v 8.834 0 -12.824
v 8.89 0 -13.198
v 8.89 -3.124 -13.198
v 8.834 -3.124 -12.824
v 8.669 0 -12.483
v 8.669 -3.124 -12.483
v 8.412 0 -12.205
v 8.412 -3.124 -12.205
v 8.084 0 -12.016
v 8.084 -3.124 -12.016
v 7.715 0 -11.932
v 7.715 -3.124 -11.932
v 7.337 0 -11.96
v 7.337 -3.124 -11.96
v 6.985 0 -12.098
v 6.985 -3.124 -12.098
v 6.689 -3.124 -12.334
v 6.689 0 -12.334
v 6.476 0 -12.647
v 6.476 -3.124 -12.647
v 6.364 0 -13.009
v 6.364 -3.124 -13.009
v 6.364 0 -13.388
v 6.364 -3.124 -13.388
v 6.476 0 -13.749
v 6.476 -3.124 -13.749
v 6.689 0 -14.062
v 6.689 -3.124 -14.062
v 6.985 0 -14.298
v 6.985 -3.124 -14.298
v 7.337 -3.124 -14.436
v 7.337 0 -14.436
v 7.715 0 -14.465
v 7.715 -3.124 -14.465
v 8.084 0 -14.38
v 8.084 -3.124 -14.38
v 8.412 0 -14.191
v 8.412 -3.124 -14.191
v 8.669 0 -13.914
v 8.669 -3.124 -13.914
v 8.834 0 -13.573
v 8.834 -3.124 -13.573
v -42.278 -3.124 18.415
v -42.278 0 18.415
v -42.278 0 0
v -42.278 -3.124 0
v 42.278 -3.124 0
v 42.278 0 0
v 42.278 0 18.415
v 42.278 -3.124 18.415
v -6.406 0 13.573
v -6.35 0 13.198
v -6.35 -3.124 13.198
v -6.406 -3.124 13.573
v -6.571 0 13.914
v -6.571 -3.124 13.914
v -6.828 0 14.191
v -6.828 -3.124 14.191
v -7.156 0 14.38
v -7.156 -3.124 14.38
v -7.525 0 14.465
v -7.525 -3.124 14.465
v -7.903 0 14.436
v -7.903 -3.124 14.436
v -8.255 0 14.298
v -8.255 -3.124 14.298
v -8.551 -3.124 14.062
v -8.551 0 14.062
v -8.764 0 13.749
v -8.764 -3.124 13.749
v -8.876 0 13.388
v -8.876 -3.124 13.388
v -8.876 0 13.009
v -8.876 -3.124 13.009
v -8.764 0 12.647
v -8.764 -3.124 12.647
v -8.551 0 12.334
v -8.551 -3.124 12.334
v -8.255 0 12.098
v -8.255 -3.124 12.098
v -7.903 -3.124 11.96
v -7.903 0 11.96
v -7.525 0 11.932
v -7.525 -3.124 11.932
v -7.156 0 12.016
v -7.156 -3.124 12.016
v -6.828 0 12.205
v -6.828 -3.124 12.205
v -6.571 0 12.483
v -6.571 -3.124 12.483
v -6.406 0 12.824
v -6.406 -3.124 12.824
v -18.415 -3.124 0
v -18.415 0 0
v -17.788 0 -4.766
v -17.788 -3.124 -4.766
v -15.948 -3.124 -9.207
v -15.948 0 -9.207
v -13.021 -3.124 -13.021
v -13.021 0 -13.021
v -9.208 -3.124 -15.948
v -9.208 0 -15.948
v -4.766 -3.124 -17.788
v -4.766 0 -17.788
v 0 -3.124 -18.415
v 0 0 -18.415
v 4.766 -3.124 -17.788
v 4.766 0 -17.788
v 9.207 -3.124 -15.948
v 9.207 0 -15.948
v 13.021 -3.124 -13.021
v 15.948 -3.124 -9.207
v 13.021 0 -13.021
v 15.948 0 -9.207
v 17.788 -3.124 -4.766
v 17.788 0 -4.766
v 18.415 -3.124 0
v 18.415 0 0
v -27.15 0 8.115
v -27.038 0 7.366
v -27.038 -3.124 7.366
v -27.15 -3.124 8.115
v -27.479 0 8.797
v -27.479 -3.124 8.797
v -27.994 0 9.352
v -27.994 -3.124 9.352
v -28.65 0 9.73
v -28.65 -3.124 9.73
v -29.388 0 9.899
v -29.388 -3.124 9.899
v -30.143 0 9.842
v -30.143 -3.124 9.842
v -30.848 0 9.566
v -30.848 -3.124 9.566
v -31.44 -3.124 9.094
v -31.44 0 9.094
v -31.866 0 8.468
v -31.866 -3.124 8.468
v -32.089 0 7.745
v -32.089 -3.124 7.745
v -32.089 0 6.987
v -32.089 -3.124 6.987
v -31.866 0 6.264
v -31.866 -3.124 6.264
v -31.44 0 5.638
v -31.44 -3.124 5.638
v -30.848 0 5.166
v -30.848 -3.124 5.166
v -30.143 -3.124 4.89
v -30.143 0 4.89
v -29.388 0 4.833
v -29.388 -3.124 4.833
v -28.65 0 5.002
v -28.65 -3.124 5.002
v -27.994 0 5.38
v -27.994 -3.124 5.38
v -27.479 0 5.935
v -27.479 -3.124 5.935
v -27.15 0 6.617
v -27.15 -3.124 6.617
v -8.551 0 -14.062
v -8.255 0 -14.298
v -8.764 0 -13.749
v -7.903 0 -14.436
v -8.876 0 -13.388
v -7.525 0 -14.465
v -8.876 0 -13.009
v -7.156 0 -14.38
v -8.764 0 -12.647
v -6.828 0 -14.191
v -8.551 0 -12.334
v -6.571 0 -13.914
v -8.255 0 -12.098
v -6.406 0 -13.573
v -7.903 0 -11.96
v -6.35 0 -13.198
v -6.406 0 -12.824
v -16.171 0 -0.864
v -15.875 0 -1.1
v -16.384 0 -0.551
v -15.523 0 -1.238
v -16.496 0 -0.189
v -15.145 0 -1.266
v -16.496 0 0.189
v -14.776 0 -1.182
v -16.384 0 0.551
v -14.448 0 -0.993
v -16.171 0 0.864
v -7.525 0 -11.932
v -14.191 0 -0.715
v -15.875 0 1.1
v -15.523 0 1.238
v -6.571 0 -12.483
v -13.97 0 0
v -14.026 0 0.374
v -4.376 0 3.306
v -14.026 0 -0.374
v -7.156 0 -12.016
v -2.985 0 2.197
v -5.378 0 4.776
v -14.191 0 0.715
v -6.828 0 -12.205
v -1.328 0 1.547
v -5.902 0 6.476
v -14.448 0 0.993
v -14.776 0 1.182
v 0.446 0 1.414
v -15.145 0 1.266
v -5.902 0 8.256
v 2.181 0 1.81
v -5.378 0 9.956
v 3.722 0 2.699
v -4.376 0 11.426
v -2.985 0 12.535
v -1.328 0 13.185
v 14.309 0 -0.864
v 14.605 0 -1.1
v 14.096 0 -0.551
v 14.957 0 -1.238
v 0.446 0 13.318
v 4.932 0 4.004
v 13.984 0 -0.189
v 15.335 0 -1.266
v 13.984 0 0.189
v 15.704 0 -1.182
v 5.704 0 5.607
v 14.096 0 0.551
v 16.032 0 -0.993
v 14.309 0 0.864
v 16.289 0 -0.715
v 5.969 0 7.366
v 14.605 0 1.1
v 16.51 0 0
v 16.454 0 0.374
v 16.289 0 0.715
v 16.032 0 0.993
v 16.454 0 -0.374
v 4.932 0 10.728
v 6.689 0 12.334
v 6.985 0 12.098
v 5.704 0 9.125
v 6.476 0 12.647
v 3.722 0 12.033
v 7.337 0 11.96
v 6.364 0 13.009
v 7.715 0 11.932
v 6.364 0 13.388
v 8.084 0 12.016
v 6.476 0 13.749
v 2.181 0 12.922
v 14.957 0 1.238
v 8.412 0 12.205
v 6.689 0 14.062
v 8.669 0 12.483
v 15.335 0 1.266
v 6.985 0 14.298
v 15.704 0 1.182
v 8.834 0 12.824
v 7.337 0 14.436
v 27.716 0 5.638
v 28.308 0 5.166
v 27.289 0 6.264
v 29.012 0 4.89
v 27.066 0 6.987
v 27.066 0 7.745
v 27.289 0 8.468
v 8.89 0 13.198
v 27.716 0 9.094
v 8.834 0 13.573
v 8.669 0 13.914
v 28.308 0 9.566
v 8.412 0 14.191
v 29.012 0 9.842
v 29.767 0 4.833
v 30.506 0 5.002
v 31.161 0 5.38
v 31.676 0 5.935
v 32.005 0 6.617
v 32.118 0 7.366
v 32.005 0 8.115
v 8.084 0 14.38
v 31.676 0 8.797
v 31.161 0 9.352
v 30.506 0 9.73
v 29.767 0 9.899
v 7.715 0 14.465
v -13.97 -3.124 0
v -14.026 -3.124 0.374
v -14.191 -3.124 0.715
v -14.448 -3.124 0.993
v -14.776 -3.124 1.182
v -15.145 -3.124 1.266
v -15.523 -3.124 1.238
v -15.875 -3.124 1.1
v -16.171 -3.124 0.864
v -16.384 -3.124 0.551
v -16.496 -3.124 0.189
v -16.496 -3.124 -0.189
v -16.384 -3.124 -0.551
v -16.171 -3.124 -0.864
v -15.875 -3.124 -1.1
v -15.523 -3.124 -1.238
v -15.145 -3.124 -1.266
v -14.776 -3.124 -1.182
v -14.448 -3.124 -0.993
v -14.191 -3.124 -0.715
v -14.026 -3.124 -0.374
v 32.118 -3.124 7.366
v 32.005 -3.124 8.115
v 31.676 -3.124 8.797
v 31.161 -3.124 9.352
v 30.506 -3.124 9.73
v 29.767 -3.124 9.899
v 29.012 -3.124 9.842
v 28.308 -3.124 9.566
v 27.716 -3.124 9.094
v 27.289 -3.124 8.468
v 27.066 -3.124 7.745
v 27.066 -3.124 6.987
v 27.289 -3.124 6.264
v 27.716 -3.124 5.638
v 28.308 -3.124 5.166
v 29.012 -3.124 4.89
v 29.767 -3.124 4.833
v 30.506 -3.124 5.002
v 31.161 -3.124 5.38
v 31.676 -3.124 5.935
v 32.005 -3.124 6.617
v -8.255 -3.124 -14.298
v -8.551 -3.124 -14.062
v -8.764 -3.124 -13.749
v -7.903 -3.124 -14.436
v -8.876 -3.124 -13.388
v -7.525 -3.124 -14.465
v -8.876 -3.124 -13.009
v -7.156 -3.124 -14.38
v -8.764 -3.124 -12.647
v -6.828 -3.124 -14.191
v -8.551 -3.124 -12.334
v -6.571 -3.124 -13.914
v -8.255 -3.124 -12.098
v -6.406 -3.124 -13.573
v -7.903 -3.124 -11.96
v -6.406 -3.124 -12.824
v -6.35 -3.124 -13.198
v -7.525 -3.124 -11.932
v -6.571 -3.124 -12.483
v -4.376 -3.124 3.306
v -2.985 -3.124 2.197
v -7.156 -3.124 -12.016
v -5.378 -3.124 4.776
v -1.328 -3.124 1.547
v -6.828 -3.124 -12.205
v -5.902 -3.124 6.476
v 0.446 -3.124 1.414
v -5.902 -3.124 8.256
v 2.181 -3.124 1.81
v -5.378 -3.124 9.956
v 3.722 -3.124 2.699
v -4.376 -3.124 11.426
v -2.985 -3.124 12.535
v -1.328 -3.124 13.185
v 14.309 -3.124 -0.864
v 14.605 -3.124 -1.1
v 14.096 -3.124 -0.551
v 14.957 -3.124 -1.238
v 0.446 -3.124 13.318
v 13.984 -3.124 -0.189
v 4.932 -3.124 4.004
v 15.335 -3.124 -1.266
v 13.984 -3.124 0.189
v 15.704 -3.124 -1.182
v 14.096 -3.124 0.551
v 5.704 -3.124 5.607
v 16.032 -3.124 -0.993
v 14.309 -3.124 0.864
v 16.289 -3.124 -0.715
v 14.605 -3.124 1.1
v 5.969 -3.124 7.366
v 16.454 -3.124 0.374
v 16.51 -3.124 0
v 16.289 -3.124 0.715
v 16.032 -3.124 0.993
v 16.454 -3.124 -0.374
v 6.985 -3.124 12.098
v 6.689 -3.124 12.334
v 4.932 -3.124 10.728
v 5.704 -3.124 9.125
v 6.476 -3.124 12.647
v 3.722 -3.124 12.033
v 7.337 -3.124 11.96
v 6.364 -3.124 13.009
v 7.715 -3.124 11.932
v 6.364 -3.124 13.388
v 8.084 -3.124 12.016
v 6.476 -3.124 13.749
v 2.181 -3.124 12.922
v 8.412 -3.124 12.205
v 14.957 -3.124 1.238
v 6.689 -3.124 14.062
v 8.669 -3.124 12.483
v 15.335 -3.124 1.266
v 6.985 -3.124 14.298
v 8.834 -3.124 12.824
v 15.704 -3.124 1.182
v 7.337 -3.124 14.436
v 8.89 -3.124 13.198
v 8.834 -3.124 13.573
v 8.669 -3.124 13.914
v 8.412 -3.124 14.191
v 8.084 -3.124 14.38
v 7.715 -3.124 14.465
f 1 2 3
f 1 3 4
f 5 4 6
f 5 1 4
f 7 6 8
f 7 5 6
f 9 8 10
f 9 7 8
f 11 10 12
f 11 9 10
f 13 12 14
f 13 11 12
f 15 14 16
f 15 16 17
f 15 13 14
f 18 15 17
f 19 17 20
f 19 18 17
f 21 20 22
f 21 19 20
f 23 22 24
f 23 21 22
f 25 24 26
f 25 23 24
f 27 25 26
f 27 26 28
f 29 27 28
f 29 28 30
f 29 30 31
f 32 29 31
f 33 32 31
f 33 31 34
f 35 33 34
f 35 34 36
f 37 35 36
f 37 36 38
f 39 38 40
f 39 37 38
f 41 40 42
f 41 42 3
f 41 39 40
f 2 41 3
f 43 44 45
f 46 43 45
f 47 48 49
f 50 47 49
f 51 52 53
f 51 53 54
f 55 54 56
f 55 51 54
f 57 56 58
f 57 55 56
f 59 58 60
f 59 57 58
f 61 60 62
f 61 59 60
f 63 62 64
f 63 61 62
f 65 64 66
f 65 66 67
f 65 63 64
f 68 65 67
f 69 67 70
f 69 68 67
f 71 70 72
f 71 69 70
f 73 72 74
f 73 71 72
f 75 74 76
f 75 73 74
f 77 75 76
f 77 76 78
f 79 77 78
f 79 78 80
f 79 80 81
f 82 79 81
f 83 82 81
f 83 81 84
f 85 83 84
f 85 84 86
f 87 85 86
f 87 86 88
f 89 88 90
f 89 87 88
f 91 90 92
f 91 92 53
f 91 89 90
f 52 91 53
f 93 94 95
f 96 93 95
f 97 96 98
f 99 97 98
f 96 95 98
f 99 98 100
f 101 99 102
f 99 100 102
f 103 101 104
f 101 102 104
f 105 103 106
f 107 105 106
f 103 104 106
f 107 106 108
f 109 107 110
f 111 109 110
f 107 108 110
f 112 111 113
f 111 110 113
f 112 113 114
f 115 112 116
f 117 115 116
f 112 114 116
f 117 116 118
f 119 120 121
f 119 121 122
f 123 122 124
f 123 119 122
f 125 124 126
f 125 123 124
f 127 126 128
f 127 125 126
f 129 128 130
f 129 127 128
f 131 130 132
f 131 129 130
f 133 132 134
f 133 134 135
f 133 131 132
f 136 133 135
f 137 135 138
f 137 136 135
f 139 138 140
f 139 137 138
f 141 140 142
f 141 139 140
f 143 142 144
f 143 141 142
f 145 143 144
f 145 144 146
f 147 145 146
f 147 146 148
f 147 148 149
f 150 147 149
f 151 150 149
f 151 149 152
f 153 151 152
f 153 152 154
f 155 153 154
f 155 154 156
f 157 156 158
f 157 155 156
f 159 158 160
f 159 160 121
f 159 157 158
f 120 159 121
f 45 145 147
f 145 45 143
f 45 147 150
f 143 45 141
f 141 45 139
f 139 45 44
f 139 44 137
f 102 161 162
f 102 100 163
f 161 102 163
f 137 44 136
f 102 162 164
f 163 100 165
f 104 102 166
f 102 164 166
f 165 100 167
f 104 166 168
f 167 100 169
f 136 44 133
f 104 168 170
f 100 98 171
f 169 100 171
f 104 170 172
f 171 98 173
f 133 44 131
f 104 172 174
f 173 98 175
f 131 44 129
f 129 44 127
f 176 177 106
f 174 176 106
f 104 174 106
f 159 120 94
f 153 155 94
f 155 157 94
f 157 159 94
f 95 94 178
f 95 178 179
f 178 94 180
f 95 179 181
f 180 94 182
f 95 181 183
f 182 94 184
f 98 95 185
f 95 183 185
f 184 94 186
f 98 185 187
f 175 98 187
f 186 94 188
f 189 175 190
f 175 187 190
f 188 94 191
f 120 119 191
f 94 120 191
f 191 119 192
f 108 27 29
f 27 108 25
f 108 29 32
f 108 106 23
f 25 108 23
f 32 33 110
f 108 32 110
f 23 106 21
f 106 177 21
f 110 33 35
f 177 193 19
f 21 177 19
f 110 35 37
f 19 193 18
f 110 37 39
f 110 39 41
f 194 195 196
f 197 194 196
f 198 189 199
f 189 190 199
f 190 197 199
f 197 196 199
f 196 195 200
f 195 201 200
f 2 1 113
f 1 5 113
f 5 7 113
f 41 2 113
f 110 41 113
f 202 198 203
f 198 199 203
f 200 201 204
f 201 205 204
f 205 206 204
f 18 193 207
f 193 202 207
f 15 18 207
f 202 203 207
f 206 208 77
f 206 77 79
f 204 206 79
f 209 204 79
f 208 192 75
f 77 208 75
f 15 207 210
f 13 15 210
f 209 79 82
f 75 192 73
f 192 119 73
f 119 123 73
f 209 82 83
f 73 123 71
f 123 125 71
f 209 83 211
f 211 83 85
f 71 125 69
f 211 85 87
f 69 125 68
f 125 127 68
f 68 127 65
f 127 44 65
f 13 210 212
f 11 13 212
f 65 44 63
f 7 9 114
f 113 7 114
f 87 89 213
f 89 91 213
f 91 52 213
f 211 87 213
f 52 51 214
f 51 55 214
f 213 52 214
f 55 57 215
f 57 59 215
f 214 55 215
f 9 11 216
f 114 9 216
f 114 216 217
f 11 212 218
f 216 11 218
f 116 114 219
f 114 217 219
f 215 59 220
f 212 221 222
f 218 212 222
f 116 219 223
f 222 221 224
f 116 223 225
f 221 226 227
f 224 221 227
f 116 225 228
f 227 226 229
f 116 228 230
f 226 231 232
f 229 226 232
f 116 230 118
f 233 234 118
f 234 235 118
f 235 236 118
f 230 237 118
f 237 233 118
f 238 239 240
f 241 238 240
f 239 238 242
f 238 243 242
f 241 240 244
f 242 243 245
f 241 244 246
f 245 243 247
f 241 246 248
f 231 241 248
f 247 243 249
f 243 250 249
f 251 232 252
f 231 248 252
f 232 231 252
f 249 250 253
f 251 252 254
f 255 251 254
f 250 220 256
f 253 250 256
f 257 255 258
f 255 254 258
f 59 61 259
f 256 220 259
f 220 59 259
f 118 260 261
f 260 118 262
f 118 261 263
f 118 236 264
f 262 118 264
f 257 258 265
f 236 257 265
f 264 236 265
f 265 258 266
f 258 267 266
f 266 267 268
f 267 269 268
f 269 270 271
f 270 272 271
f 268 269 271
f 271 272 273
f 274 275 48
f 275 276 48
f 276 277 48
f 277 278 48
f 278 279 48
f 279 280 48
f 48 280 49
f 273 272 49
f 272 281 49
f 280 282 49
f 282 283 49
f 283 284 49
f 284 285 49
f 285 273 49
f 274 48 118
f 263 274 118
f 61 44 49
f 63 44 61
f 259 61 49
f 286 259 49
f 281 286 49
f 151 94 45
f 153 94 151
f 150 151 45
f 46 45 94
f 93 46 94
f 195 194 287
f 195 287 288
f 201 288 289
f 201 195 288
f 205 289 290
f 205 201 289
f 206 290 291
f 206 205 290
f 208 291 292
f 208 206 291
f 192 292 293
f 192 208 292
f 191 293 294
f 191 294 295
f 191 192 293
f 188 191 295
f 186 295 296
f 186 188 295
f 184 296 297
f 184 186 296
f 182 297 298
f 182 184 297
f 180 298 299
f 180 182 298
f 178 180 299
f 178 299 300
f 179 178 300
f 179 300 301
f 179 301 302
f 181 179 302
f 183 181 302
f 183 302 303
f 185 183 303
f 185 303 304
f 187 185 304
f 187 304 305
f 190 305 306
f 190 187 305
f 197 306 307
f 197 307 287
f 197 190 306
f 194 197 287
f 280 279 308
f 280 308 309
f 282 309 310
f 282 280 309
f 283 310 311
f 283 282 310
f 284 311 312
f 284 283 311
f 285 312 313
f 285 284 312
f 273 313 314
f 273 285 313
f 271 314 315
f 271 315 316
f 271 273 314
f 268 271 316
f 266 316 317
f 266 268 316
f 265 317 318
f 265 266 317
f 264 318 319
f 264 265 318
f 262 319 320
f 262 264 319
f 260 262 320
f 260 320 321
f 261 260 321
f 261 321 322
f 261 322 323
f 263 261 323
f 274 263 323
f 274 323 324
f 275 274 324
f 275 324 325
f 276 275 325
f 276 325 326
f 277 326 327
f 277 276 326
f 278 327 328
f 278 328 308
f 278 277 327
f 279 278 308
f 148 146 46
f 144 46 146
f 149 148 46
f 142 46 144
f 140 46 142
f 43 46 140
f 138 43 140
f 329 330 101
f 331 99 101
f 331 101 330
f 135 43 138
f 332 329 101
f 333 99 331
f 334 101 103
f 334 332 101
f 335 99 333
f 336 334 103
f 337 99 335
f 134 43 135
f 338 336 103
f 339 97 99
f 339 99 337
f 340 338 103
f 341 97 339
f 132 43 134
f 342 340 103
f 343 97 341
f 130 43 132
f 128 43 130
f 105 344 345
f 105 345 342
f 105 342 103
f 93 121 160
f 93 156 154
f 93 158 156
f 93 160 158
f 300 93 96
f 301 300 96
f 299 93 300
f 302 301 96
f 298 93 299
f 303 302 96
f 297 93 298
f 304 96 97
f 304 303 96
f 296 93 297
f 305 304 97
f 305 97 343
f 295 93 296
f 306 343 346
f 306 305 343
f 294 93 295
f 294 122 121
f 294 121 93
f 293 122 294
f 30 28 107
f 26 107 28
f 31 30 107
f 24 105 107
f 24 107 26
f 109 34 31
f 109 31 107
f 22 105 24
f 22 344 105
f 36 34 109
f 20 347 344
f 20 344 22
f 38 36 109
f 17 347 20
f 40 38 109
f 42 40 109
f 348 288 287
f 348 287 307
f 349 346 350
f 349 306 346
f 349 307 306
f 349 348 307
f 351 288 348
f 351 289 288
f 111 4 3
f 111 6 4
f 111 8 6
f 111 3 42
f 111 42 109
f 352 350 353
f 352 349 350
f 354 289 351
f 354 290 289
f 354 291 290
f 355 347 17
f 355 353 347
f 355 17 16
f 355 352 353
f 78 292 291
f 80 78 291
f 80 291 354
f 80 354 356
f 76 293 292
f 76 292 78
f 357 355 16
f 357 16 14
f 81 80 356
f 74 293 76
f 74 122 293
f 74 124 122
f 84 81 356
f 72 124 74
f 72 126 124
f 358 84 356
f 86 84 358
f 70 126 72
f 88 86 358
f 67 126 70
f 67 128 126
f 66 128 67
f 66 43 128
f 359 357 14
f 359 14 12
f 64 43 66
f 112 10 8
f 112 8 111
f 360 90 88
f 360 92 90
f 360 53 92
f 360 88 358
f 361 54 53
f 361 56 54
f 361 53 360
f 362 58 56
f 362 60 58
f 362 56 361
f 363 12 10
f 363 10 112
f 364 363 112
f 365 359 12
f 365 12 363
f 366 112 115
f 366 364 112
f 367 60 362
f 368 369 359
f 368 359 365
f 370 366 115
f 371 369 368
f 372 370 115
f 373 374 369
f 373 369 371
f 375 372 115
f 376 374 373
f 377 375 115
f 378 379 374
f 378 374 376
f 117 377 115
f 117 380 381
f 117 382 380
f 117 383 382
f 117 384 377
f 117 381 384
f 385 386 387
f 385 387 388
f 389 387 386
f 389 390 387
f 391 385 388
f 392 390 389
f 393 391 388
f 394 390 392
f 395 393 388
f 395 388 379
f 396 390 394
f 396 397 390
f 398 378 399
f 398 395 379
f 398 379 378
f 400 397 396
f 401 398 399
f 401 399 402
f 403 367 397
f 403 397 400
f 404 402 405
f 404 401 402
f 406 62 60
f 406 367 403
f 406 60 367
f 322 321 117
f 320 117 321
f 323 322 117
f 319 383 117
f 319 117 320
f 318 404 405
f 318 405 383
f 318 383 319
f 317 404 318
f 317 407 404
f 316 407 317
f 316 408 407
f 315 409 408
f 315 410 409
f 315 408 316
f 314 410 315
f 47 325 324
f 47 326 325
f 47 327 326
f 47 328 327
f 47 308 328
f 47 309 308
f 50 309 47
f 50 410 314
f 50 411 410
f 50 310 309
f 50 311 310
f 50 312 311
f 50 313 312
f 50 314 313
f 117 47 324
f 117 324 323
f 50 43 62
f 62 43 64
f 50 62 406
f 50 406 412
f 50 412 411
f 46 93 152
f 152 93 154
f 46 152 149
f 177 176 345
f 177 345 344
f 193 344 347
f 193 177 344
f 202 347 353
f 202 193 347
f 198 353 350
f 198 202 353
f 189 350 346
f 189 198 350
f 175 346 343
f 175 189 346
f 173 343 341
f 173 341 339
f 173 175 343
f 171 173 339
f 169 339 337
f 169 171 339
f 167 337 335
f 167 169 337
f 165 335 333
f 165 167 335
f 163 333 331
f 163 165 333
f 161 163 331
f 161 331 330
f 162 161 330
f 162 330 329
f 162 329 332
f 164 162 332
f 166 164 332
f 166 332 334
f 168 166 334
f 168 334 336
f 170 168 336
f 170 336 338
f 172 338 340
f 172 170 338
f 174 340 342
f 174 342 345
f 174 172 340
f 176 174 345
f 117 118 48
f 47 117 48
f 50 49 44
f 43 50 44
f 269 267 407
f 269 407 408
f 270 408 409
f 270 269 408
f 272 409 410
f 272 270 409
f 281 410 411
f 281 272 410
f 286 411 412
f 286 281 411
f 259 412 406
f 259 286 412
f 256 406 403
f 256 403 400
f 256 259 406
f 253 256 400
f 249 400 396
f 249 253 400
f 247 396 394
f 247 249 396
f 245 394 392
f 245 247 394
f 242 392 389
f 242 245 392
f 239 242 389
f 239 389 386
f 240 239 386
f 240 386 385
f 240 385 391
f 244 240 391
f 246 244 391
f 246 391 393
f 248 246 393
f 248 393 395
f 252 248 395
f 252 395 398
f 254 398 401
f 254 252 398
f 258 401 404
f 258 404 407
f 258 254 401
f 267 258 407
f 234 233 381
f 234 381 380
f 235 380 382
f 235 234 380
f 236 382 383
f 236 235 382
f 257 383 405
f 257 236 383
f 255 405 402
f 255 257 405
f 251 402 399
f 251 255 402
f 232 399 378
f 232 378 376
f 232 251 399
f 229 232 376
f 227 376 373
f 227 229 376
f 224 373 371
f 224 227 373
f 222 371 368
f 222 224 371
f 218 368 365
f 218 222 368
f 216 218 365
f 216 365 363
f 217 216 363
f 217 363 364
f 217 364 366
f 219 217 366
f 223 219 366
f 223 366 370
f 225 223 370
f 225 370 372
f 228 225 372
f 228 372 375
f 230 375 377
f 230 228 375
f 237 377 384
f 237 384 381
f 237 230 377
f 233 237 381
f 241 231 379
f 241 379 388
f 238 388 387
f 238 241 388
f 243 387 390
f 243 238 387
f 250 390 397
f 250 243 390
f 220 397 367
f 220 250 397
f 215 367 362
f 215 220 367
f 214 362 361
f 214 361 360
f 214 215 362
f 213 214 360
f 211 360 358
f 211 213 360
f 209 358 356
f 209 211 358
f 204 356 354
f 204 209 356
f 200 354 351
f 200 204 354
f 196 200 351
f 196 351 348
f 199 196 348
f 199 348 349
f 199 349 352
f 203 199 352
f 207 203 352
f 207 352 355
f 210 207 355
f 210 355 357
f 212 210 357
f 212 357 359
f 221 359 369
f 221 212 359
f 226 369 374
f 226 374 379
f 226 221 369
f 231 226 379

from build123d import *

# Parameters (mm, degrees)
F0_R     = 1.27
F0_R_2   = 5.969
F0_R_3   = 2.54
F1_DEPTH = 3.1242


with BuildPart() as f1:
    # F0 (on Front) → F1 (new body)
    with BuildSketch(Plane.XZ):
        with BuildLine():
            ThreePointArc((-18.415, 0), (0, -18.415), (18.415, 0))
            ThreePointArc((18.415, 0), (13.021371, 13.021371), (0, 18.415))
            ThreePointArc((0, 18.415), (-13.021371, 13.021371), (-18.415, 0))
        make_face()
        with Locations((-7.62, -13.198227)):
            Circle(F0_R, mode=Mode.SUBTRACT)
        with Locations((-15.24, 0)):
            Circle(F0_R, mode=Mode.SUBTRACT)
        with Locations((7.62, -13.198227)):
            Circle(F0_R, mode=Mode.SUBTRACT)
        with Locations((15.24, 0)):
            Circle(F0_R, mode=Mode.SUBTRACT)
        with Locations((-7.62, 13.198227)):
            Circle(F0_R, mode=Mode.SUBTRACT)
        with Locations((0, 7.366)):
            Circle(F0_R_2, mode=Mode.SUBTRACT)
        with Locations((7.62, 13.198227)):
            Circle(F0_R, mode=Mode.SUBTRACT)
        with BuildLine():
            ThreePointArc((-18.415, 0), (-13.021371, 13.021371), (0, 18.415))
            Line((0, 18.415), (-42.277626, 18.415))
            Line((-42.277626, 18.415), (-42.277626, 0))
            Line((-42.277626, 0), (-18.415, 0))
        make_face()
        with Locations((-29.577626, 7.366)):
            Circle(F0_R_3, mode=Mode.SUBTRACT)
        with BuildLine():
            ThreePointArc((0, 18.415), (13.021371, 13.021371), (18.415, 0))
            Line((18.415, 0), (42.277626, 0))
            Line((42.277626, 0), (42.277626, 18.415))
            Line((42.277626, 18.415), (0, 18.415))
        make_face()
        with Locations((29.577626, 7.366)):
            Circle(F0_R_3, mode=Mode.SUBTRACT)
    extrude(amount=F1_DEPTH)


solid = f1.part
